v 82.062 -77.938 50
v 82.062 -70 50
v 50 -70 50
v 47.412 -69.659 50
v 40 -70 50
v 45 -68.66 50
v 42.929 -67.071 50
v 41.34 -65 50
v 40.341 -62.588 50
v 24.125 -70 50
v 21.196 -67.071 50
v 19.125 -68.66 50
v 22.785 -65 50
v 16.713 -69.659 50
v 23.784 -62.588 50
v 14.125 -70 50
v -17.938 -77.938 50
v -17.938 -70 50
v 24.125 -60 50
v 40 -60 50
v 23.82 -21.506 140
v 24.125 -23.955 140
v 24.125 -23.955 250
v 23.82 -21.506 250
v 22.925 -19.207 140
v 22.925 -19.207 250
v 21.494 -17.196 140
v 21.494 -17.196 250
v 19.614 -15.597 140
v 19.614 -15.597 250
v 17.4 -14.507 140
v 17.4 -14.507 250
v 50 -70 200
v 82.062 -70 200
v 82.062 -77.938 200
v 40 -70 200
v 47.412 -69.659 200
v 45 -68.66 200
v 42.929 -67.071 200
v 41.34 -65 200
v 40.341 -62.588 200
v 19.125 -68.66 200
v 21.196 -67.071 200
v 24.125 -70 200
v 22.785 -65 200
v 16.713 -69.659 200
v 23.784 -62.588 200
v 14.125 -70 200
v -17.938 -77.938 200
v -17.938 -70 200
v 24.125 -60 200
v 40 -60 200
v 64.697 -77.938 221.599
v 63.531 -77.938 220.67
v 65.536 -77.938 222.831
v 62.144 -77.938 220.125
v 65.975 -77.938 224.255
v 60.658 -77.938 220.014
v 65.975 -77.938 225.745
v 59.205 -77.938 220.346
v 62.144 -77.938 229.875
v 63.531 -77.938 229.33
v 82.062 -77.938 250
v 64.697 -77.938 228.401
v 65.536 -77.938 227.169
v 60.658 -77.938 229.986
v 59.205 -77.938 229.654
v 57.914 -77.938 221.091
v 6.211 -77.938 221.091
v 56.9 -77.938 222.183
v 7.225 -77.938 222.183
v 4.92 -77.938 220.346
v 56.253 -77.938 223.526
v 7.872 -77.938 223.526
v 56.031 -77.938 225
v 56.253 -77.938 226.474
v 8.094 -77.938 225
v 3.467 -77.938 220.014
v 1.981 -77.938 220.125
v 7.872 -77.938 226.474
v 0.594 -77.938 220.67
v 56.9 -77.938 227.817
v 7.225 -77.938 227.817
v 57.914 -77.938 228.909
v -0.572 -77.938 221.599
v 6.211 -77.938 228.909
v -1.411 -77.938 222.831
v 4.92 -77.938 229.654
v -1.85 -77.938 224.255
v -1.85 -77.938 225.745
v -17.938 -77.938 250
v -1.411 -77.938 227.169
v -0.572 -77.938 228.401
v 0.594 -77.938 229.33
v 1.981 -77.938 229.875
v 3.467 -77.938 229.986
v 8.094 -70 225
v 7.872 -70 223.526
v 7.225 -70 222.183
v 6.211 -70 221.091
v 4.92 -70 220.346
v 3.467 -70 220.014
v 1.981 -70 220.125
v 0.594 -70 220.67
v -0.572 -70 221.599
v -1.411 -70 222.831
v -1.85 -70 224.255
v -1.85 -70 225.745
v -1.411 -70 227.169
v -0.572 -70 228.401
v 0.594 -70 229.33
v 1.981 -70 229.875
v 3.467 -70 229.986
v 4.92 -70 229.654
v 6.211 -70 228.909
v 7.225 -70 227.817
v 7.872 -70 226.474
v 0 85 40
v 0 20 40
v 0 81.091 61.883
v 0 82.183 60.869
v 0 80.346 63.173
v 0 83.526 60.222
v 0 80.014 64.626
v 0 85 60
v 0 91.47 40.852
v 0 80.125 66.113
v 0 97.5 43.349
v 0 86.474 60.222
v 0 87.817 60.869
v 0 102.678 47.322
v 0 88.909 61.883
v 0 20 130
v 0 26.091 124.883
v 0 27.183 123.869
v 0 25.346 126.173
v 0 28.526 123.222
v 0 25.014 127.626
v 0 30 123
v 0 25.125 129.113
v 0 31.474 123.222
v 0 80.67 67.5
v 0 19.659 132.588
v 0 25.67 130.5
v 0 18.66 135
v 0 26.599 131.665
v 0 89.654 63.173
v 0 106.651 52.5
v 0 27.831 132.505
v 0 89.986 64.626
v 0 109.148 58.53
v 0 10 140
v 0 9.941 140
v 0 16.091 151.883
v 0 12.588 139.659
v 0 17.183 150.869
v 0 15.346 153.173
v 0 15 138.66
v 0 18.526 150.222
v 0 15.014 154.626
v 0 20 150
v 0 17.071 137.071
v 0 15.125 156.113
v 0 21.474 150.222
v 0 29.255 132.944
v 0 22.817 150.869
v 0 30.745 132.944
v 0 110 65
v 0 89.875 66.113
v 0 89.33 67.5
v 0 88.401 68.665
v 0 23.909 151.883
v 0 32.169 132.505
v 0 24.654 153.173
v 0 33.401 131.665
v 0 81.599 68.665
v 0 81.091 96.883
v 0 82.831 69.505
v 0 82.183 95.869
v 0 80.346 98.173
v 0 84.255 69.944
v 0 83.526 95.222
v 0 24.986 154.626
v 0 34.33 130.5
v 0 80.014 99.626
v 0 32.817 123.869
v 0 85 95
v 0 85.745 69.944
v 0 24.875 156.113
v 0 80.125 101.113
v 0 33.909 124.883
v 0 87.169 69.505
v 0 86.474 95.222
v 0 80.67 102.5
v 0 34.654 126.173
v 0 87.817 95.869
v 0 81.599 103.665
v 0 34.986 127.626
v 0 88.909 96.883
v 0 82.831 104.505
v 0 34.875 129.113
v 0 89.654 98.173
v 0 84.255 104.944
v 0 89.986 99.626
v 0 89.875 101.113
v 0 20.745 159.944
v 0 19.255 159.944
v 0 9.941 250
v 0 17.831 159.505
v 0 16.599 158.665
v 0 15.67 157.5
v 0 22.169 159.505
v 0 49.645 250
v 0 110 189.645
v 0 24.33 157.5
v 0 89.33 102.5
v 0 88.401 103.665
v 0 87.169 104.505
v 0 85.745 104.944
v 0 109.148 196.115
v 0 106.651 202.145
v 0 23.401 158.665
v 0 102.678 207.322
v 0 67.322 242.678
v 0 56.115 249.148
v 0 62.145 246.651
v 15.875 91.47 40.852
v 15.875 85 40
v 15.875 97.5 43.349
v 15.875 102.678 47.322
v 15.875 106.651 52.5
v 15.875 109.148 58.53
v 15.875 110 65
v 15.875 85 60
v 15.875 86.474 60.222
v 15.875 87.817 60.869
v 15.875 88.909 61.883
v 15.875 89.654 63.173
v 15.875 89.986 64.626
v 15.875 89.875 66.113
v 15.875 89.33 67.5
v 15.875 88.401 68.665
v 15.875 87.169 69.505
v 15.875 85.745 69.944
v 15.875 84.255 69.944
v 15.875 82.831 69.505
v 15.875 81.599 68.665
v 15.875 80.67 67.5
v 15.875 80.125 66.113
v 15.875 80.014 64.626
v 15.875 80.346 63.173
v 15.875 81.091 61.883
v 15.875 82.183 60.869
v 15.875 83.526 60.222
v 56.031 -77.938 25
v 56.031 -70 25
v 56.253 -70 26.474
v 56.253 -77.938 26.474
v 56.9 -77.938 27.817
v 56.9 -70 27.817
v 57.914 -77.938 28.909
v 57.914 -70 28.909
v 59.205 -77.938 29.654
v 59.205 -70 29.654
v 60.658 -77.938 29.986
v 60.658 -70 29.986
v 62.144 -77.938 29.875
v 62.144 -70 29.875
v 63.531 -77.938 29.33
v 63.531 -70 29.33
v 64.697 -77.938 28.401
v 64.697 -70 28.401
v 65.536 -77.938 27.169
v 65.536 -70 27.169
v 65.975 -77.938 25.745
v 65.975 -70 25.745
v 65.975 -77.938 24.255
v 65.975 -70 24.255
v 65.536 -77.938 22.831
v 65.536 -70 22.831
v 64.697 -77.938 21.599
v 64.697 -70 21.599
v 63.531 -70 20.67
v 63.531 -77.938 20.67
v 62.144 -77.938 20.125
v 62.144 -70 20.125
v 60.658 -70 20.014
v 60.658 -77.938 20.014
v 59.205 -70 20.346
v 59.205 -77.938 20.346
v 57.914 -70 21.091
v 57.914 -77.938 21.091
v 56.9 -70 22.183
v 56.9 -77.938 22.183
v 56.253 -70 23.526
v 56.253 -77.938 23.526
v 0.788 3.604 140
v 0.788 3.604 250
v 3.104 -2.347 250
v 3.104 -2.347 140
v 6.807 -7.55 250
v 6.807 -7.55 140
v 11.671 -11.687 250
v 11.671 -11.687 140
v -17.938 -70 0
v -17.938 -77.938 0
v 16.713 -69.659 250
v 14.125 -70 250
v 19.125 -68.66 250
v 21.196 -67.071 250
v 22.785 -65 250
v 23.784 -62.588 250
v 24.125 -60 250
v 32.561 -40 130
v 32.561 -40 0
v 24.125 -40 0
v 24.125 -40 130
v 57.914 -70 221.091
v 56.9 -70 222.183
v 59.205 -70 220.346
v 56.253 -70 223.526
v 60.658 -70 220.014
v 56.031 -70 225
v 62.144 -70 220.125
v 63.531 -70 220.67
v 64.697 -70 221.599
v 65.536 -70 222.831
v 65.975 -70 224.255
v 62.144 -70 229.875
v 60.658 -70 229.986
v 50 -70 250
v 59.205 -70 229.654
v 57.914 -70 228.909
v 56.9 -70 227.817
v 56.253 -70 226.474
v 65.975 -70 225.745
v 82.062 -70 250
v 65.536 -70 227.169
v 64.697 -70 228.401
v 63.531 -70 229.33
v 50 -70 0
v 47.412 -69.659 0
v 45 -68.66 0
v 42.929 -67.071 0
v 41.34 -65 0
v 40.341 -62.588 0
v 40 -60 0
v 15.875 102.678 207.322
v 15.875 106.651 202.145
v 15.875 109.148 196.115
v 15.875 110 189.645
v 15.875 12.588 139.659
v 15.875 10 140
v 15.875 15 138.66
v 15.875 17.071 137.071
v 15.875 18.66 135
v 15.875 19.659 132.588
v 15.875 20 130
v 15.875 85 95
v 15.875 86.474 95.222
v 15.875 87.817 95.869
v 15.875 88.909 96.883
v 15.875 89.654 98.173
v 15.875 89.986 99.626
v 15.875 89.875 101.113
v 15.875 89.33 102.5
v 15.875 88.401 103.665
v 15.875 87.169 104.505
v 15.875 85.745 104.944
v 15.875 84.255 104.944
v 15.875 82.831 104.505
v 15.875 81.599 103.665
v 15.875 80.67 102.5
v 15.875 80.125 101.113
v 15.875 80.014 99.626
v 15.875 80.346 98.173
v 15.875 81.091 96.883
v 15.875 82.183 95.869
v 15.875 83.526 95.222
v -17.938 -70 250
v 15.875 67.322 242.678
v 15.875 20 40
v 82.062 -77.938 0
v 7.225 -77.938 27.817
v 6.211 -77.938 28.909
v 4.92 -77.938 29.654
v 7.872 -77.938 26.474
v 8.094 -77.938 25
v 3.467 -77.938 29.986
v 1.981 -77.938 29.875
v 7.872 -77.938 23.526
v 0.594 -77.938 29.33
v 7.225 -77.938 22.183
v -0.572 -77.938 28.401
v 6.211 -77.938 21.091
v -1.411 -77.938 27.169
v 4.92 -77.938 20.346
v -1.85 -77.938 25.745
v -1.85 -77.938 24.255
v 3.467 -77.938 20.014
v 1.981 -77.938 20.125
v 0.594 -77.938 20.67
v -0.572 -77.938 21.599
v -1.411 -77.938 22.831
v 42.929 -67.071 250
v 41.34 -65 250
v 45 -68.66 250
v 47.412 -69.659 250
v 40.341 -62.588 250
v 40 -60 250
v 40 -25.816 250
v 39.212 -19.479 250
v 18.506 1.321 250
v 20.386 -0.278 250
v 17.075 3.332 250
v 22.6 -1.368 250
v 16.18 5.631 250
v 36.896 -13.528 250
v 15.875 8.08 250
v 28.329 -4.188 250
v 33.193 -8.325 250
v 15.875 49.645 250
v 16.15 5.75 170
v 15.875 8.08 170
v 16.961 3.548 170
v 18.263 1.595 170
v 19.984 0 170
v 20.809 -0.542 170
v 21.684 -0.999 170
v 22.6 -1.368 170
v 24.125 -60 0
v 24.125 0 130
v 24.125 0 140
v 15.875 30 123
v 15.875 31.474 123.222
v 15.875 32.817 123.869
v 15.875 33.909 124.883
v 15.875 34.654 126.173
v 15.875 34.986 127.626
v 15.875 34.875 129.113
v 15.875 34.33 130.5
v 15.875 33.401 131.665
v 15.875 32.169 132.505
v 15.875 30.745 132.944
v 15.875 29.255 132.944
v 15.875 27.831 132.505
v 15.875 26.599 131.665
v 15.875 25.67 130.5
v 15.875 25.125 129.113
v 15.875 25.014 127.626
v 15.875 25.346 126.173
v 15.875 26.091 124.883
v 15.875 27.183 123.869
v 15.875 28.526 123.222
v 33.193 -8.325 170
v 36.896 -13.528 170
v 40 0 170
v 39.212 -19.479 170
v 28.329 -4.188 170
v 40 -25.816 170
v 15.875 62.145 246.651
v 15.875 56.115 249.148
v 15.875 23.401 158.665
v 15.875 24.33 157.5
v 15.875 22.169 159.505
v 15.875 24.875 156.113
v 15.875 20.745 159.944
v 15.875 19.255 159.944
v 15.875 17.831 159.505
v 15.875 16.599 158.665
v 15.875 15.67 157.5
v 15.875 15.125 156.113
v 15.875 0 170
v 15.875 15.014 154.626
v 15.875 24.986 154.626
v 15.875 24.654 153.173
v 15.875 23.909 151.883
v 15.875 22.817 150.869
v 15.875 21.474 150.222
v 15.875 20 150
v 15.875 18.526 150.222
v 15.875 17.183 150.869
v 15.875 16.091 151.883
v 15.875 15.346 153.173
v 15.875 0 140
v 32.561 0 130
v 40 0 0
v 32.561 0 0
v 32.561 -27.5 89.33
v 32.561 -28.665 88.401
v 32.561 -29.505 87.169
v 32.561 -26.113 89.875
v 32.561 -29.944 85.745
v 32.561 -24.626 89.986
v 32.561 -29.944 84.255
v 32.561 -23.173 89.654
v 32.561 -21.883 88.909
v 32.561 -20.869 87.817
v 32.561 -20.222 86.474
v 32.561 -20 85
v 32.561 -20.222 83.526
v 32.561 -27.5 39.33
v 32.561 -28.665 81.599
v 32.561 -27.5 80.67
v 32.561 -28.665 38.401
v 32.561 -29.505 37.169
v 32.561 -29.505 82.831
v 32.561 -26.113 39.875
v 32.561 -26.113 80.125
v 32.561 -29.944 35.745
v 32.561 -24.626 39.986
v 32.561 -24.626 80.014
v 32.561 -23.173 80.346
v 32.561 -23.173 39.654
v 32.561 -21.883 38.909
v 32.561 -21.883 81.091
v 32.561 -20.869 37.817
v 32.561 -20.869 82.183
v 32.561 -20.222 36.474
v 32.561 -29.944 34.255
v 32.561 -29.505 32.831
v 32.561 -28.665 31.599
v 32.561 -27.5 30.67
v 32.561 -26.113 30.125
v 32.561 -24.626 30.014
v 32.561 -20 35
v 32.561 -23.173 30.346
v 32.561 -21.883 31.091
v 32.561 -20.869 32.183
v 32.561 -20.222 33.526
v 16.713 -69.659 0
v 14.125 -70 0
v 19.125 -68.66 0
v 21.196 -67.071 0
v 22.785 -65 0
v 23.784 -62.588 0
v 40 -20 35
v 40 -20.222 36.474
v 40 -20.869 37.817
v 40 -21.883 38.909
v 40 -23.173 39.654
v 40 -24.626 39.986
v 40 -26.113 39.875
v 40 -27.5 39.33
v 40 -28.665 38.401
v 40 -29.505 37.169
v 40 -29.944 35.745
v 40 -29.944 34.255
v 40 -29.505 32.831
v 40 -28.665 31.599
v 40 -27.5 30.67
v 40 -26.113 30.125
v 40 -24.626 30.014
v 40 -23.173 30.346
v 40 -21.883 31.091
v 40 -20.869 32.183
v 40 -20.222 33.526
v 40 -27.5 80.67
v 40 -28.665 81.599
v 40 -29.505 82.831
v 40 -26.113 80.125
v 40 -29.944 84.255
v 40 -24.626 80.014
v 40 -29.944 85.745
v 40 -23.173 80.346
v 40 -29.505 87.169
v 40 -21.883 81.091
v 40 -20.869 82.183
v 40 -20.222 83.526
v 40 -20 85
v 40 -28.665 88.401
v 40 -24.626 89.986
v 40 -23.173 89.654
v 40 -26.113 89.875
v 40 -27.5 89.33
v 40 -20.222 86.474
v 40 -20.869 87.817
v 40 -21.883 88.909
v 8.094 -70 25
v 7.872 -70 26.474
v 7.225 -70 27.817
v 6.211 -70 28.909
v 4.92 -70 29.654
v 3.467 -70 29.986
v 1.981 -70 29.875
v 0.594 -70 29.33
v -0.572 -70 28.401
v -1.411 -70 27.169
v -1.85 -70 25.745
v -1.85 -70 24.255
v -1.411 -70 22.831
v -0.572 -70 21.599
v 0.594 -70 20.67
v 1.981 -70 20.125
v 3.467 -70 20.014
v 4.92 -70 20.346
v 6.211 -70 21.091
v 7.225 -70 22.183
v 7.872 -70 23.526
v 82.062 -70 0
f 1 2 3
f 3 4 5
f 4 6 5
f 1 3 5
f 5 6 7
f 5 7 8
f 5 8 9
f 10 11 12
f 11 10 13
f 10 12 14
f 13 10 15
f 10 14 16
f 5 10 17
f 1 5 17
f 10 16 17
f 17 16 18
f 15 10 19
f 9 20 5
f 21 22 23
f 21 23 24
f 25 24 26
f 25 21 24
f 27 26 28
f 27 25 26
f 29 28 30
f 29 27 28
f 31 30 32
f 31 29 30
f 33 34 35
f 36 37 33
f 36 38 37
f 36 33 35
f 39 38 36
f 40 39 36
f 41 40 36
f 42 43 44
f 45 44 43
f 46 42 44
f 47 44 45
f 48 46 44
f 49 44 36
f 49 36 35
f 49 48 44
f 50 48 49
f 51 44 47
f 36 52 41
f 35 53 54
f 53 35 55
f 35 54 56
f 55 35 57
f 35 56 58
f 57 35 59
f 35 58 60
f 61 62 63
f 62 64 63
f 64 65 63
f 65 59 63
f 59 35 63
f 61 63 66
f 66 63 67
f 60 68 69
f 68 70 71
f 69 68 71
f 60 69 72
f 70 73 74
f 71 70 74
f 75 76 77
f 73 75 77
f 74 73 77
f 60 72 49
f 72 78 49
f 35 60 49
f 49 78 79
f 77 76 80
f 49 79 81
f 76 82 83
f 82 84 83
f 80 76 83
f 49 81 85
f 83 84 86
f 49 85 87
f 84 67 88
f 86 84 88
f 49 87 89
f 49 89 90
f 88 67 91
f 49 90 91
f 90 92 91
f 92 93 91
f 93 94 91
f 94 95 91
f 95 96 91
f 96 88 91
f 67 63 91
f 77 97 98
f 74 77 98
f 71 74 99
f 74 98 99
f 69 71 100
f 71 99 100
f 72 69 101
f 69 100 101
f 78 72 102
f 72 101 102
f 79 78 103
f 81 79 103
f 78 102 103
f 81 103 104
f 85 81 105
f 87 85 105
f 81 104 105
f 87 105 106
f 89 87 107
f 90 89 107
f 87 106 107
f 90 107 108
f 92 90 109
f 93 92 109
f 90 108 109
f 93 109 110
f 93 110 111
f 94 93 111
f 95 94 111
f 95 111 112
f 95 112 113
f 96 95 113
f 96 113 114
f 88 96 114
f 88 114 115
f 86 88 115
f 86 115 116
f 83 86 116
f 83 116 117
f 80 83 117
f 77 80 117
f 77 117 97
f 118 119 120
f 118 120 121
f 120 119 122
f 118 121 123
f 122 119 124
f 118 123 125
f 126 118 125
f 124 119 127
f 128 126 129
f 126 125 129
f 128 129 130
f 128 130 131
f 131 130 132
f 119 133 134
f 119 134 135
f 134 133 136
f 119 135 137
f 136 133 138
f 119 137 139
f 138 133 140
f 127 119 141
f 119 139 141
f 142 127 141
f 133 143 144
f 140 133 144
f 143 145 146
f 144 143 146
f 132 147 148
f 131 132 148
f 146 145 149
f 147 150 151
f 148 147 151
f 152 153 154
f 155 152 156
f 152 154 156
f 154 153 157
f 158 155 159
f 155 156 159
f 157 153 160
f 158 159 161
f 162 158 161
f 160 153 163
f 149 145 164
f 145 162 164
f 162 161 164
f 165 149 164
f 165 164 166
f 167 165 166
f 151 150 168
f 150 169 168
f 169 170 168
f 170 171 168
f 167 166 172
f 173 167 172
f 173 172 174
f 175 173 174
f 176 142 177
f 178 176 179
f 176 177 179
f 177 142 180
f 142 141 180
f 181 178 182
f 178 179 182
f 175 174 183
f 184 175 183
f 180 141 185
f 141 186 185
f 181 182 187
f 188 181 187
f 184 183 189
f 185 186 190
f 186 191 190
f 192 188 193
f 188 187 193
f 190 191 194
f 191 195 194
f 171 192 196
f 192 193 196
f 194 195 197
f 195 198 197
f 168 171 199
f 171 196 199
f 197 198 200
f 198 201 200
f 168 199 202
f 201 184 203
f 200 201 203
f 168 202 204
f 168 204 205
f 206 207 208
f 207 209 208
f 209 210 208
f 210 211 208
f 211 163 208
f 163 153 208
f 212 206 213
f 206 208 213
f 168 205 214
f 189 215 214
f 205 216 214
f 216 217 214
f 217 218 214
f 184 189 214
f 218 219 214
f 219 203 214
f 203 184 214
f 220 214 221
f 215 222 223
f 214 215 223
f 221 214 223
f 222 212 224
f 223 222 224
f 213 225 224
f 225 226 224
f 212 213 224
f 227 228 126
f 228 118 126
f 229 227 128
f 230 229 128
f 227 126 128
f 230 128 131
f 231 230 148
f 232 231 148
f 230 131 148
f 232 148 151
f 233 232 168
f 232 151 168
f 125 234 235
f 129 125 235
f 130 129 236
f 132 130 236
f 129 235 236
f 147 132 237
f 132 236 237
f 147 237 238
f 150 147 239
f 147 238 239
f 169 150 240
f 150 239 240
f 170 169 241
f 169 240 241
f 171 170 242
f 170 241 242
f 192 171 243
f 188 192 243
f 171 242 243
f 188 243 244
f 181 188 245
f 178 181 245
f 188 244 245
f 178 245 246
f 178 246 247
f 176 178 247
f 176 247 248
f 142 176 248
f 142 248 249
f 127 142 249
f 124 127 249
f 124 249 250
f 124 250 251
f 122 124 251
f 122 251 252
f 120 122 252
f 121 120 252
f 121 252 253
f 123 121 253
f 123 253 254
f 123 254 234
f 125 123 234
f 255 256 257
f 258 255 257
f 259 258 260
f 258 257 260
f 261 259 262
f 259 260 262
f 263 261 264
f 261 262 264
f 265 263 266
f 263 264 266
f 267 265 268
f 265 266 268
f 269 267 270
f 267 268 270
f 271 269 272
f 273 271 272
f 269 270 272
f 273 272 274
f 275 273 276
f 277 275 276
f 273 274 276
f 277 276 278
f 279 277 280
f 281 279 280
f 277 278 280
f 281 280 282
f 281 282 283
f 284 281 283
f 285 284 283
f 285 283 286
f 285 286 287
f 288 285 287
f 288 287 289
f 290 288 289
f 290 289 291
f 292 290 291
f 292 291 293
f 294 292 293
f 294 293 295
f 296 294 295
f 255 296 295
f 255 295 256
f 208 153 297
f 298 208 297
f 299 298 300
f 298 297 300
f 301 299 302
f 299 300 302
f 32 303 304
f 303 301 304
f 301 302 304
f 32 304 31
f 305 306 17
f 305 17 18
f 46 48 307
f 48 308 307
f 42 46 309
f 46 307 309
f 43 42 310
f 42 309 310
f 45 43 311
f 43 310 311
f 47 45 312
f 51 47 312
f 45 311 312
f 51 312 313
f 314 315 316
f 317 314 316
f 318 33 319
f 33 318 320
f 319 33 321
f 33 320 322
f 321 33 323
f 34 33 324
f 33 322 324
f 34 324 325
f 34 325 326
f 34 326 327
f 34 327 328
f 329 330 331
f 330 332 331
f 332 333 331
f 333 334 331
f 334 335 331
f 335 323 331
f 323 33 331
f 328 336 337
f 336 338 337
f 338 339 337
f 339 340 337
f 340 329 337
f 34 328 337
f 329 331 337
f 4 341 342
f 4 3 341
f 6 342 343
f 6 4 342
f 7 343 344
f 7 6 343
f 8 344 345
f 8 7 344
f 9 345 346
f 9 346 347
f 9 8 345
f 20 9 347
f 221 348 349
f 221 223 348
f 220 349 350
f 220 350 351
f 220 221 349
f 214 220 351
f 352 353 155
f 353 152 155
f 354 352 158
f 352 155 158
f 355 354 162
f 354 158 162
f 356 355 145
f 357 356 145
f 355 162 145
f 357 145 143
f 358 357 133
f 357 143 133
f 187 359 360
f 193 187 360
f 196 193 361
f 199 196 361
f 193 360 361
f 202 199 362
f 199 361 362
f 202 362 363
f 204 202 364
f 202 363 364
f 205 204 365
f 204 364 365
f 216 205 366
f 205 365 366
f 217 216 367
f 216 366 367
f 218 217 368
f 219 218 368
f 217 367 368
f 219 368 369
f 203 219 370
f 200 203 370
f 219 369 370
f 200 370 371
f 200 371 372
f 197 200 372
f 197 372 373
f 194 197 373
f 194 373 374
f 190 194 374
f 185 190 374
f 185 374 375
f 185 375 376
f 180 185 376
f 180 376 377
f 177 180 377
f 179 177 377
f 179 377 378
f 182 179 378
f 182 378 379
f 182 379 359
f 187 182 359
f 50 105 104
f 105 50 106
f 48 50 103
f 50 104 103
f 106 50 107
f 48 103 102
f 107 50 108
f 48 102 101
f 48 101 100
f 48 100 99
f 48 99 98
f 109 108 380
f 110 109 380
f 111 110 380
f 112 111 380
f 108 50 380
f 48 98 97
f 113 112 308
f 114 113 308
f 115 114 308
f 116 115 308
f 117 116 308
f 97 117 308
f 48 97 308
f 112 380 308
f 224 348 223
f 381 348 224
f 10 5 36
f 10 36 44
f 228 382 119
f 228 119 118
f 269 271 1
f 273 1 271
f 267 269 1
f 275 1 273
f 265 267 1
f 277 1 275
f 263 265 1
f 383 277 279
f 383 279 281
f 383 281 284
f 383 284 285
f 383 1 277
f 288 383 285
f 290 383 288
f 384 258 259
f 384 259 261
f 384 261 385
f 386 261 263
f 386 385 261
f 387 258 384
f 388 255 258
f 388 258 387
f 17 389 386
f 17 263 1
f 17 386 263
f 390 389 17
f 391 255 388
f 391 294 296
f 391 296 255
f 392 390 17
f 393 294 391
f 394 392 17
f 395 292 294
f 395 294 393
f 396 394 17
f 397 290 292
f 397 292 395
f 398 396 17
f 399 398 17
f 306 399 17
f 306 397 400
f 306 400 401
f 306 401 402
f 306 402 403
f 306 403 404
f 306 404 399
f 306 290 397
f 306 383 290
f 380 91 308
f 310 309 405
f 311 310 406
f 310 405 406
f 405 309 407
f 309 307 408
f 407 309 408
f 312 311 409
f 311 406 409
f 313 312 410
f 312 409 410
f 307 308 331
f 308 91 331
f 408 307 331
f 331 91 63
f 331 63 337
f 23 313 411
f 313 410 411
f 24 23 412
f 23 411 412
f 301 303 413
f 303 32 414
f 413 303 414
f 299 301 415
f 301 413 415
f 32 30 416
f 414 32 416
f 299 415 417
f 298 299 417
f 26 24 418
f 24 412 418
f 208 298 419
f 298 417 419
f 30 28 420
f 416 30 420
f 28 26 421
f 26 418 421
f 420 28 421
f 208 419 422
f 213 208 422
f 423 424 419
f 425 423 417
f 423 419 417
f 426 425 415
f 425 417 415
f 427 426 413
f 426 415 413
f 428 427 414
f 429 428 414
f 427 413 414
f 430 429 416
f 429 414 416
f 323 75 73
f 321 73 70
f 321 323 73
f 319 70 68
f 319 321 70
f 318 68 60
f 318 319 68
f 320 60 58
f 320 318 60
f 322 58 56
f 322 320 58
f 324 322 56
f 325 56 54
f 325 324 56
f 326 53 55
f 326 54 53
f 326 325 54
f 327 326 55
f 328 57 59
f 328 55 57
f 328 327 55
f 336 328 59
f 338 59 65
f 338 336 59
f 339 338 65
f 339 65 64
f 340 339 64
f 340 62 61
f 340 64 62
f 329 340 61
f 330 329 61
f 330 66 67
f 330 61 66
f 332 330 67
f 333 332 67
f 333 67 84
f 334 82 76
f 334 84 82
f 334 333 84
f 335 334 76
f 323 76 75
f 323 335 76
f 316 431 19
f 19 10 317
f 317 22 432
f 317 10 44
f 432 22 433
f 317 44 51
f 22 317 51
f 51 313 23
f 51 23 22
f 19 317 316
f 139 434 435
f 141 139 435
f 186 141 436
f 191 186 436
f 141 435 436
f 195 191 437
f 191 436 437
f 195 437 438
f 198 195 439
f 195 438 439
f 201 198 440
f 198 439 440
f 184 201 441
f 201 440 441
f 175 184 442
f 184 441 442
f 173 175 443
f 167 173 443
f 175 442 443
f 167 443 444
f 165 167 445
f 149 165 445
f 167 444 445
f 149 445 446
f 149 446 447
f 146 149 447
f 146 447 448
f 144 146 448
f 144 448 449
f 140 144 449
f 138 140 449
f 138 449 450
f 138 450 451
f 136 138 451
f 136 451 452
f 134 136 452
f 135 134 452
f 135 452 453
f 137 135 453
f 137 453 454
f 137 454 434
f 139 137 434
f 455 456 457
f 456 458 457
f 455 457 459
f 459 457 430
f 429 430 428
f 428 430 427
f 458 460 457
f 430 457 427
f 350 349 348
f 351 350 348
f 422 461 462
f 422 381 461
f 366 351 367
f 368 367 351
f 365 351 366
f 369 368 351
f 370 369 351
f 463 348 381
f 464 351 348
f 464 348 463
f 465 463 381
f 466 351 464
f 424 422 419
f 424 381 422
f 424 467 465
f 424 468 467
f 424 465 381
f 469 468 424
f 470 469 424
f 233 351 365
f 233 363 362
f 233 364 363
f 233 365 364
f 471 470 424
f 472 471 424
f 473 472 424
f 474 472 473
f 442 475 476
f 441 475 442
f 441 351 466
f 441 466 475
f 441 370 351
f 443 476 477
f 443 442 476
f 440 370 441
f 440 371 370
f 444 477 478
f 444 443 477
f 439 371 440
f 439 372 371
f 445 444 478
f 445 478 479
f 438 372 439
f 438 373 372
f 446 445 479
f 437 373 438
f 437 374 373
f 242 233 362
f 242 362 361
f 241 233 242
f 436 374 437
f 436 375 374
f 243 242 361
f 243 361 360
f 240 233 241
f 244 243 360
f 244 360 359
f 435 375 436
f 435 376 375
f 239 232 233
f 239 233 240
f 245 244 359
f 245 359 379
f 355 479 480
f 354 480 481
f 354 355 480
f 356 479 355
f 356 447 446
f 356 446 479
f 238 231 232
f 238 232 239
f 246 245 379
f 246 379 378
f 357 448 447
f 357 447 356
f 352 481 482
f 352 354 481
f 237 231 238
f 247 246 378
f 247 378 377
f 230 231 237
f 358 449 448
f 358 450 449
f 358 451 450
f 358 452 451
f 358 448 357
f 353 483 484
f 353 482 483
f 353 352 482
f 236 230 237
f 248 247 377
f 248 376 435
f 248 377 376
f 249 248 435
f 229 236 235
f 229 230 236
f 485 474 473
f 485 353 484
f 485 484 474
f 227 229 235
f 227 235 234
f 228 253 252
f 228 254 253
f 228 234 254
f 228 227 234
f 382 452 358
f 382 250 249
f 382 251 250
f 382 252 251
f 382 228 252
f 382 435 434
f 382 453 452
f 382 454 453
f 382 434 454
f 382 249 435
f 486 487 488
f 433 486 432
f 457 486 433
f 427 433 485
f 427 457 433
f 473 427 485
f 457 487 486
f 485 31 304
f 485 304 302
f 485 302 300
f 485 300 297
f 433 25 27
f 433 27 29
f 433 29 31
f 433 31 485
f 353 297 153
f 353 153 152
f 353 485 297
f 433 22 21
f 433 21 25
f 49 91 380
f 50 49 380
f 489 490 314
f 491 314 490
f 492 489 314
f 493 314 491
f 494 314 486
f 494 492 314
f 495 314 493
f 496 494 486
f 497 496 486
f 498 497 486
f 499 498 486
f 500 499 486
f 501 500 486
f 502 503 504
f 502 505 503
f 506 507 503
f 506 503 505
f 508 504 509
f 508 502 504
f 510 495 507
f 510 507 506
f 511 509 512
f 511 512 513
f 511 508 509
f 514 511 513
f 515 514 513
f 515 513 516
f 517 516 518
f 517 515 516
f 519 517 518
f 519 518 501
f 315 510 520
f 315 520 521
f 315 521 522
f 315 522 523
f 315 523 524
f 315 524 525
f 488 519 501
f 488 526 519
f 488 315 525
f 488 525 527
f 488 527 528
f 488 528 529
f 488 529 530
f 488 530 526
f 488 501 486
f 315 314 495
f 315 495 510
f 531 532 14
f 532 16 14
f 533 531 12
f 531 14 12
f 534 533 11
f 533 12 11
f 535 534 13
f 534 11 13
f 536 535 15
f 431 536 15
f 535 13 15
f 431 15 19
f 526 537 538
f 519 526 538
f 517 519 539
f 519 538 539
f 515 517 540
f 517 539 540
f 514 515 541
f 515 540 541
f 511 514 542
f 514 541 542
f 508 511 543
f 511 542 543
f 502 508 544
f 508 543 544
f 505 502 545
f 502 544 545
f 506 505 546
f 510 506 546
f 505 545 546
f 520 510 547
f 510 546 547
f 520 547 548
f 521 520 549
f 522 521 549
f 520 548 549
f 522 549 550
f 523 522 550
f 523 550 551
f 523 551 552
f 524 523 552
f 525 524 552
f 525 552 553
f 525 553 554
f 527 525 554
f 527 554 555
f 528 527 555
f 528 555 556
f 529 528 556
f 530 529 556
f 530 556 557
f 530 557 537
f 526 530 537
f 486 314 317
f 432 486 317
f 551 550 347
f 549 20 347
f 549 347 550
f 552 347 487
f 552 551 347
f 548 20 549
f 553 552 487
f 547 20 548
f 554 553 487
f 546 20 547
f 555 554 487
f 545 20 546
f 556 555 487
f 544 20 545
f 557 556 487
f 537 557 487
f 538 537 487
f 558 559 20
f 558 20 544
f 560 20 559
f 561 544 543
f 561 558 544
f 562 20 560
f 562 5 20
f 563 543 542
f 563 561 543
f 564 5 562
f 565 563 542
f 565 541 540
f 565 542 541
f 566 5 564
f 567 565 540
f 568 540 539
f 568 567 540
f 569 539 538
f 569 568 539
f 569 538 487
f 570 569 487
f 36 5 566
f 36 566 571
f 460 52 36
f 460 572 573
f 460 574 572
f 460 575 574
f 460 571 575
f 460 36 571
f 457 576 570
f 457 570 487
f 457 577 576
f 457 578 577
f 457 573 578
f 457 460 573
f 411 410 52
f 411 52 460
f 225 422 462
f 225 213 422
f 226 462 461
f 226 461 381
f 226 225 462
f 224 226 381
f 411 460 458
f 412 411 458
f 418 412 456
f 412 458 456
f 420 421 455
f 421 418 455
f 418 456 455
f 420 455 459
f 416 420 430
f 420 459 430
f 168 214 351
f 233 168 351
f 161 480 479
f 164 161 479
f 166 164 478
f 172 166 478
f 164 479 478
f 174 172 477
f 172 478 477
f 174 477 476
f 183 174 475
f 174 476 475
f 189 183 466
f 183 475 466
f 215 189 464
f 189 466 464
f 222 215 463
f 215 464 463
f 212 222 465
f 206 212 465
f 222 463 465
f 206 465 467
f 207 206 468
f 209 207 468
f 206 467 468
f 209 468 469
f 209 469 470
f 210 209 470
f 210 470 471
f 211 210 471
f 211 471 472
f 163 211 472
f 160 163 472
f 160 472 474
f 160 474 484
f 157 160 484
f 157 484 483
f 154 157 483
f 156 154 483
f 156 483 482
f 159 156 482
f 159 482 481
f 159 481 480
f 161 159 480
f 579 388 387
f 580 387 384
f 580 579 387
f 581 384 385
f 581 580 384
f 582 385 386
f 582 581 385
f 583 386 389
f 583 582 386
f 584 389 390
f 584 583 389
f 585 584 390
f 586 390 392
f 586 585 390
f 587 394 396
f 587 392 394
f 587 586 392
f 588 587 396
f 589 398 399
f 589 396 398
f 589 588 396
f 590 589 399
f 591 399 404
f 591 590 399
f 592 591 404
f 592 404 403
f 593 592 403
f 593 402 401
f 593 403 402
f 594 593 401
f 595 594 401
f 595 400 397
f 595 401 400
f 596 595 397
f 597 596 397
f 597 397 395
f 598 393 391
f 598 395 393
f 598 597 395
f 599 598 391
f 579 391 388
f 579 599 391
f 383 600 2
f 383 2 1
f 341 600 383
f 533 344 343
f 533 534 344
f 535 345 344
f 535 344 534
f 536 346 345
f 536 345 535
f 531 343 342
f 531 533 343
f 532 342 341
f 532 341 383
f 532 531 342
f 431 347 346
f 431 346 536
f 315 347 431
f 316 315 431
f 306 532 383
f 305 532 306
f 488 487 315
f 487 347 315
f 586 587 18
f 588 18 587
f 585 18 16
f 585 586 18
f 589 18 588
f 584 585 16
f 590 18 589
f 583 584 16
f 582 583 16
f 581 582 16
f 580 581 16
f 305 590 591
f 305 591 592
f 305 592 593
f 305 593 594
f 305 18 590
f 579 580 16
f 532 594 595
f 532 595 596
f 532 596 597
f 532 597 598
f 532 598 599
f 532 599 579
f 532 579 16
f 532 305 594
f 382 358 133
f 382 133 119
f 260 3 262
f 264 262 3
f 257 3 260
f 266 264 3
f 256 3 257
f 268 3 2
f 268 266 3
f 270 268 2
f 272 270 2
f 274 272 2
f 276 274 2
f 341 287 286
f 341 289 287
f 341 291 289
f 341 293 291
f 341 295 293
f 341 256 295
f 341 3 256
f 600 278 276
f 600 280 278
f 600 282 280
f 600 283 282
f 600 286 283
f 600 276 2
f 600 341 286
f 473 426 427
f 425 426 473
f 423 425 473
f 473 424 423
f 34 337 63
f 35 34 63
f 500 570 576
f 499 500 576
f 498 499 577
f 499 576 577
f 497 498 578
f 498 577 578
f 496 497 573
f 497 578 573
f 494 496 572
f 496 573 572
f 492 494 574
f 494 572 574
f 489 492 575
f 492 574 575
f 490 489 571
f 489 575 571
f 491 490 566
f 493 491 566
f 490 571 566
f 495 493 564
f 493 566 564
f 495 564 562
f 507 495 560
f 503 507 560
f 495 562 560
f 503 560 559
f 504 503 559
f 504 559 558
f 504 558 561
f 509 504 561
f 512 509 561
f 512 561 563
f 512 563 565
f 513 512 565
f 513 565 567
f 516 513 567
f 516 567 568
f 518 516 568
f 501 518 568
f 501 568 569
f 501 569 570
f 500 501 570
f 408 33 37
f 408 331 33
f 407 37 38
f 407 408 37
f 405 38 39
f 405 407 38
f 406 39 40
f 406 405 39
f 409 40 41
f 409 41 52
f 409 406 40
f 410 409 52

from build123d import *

# Parameters (mm, degrees)
BOSS_EXTRUDE1_DEPTH     = 250
BOSS_EXTRUDE2_DEPTH     = 50
SKETCH3_R               = 5
CUT_EXTRUDE1_DEPTH      = 319.801276513
FILLET1_R               = 10
MIRROR2_COPY_1_SKETCH_R = 5
MIRROR2_COPY_1_DEPTH    = 319.801276513
FILLET1_OF_MIRROR2_R    = 10
CUT_EXTRUDE2_DEPTH      = 282.035202699
FILLET2_R               = 25
CUT_EXTRUDE3_DEPTH      = 282.035202699
FILLET3_R               = 25
SKETCH6_R               = 5
CUT_EXTRUDE4_DEPTH      = 280.207367213
CUT_EXTRUDE5_DEPTH      = 170
FILLET4_R               = 10
FILLET5_R               = 25.875
FILLET6_R               = 10
BOSS_EXTRUDE3_DEPTH     = 30
SKETCH9_W               = 15.875
SKETCH9_H               = 40
BOSS_EXTRUDE4_DEPTH     = 140
FILLET7_R               = 25.875
FILLET8_R               = 10
SKETCH10_W              = 8.436021397
SKETCH10_H              = 40
CUT_EXTRUDE6_DEPTH      = 130
SKETCH11_R              = 5
CUT_EXTRUDE7_DEPTH      = 280.207367213


with BuildPart() as part:
    # Sketch1 → Boss-Extrude1 (new body)
    with BuildSketch(Plane.XY):
        Polygon((0, 0), (0, 110), (15.875, 110), (15.875, 0), (40, 0), (40, -70), (24.125, -70), (24.125, -15.875), (0, -15.875), align=None)
    extrude(amount=BOSS_EXTRUDE1_DEPTH)

    # Sketch2 → Boss-Extrude2 (add)
    with BuildSketch(Plane(origin=(0, 0, 0), x_dir=(-1, 0, 0), z_dir=(0, 0, -1))):
        Polygon((-32.0625, -70), (-82.0625, -70), (-82.0625, -77.9375), (17.9375, -77.9375), (17.9375, -70), align=None)
    boss_extrude2 = extrude(amount=-BOSS_EXTRUDE2_DEPTH)

    # Sketch3 → Cut-Extrude1 (cut, through all)
    with BuildSketch(Plane(origin=(0, -70, 0), x_dir=(1, 0, 0), z_dir=(0, 1, 0))):
        with Locations(Location((61.03125, -25, 0), (0, 0, 180))):
            Circle(SKETCH3_R)
    cut_extrude1 = extrude(amount=-CUT_EXTRUDE1_DEPTH, mode=Mode.SUBTRACT)

    # Mirror1: Cut-Extrude1 across plane
    add(cut_extrude1.mirror(Plane(origin=(32.0625, 0, 0), x_dir=(0, 0, 1), z_dir=(1, 0, 0))), mode=Mode.SUBTRACT)

    # Fillet1
    fillet1_edges = [part.edges().sort_by_distance(p)[0] for p in [
        (40, -70, 25),
        (24.125, -70, 25),
    ]]
    fillet(fillet1_edges, radius=FILLET1_R)

    # Mirror2: Boss-Extrude2, Cut-Extrude1 across plane
    add(boss_extrude2.mirror(Plane(origin=(0, 0, 125), x_dir=(1, 0, 0), z_dir=(0, 0, -1))))
    add(cut_extrude1.mirror(Plane(origin=(0, 0, 125), x_dir=(1, 0, 0), z_dir=(0, 0, -1))), mode=Mode.SUBTRACT)

    # Mirror2 copy 1 sketch → Mirror2 copy 1 (cut, through all)
    with BuildSketch(Plane(origin=(64.125, -70, 250), x_dir=(-1, 0, 0), z_dir=(0, 1, 0))):
        with Locations(Location((61.03125, -25, 0), (0, 0, 180))):
            Circle(MIRROR2_COPY_1_SKETCH_R)
    extrude(amount=-MIRROR2_COPY_1_DEPTH, mode=Mode.SUBTRACT)

    # Fillet1 of Mirror2
    fillet1_of_mirror2_edges = [part.edges().sort_by_distance(p)[0] for p in [
        (40, -70, 225),
        (24.125, -70, 225),
    ]]
    fillet(fillet1_of_mirror2_edges, radius=FILLET1_OF_MIRROR2_R)

    # Sketch4 → Cut-Extrude2 (cut, through all)
    with BuildSketch(Plane(origin=(15.875, 0, 0), x_dir=(0, 0, -1), z_dir=(1, 0, 0))):
        Polygon((0, 0), (-140, 0), (-140, 20), (-40, 20), (-40, 110), (0, 110), align=None)
    extrude(amount=-CUT_EXTRUDE2_DEPTH, mode=Mode.SUBTRACT)

    # Fillet2
    fillet2_edges = [part.edges().sort_by_distance(p)[0] for p in [
        (7.9375, 110, 40),
    ]]
    fillet(fillet2_edges, radius=FILLET2_R)

    # Sketch5 → Cut-Extrude3 (cut, through all)
    with BuildSketch(Plane(origin=(15.875, 0, 0), x_dir=(0, 0, -1), z_dir=(1, 0, 0))):
        Polygon((-250, 60), (-250, 110), (-200, 110), align=None)
    extrude(amount=-CUT_EXTRUDE3_DEPTH, mode=Mode.SUBTRACT)

    # Fillet3
    fillet3_edges = [part.edges().sort_by_distance(p)[0] for p in [
        (7.9375, 60, 250),
        (7.9375, 110, 200),
    ]]
    fillet(fillet3_edges, radius=FILLET3_R)

    # Sketch6 → Cut-Extrude4 (cut, through all)
    with BuildSketch(Plane(origin=(40, 0, 0), x_dir=(0, 0, -1), z_dir=(1, 0, 0))):
        with Locations((-65, 85)):
            Circle(SKETCH6_R)
        with Locations((-100, 85)):
            Circle(SKETCH6_R)
        with Locations((-128, 30)):
            Circle(SKETCH6_R)
        with Locations((-155, 20)):
            Circle(SKETCH6_R)
        with Locations(Location((-35, -25, 0), (0, 0, 90))):
            Circle(SKETCH6_R)
        with Locations(Location((-85, -25, 0), (0, 0, 90))):
            Circle(SKETCH6_R)
    extrude(amount=-CUT_EXTRUDE4_DEPTH, mode=Mode.SUBTRACT)

    # Sketch7 → Cut-Extrude5 (cut)
    with BuildSketch(Plane(origin=(0, 0, 0), x_dir=(-1, 0, 0), z_dir=(0, 0, -1))):
        Polygon((0, 0), (-40, 0), (-40, -40), (-24.125, -40), (-24.125, -15.875), (0, -15.875), align=None)
    extrude(amount=-CUT_EXTRUDE5_DEPTH, mode=Mode.SUBTRACT)

    # Fillet4
    fillet4_edges = [part.edges().sort_by_distance(p)[0] for p in [
        (7.9375, 20, 140),
    ]]
    fillet(fillet4_edges, radius=FILLET4_R)

    # Fillet5
    # the kernel refuses this fillet: 25.875 mm, written as the material it takes off along each edge
    with BuildSketch(Plane(origin=(40, 0, 105.460616433), x_dir=(-1, 0, 0), z_dir=(0, 0, 1))) as fillet5_piece_1:
        with BuildLine():
            CenterArc((25.875, 25.815753427), FILLET5_R, 180, 86.121962796)
            Line((0, 25.815753427), (-0.5175, 25.815753427))
            Line((-0.5175, 25.815753427), (-0.5175, 0))
            Line((-0.5175, 0), (0, -0.5175))
            ThreePointArc((0, -0.5175), (12.0625, -0.5175), (24.09, -0.516315069))
            Line((24.09, -0.516315069), (24.125, 0))
        make_face()
    extrude(amount=209.078767135, mode=Mode.SUBTRACT)

    # Fillet6
    fillet6_edges = [part.edges().sort_by_distance(p)[0] for p in [
        (15.875, 0, 210),
    ]]
    fillet(fillet6_edges, radius=FILLET6_R)

    # Sketch8 → Boss-Extrude3 (add)
    with BuildSketch(Plane(origin=(0, 0, 170), x_dir=(-1, 0, 0), z_dir=(0, 0, -1))):
        Polygon((-40, -40), (-24.125, -40), (-24.125, -15.875), (0, -15.875), (0, 0), (-40, 0), align=None)
    extrude(amount=BOSS_EXTRUDE3_DEPTH)

    # Sketch9 → Boss-Extrude4 (add)
    with BuildSketch(Plane(origin=(0, 0, 140), x_dir=(-1, 0, 0), z_dir=(0, 0, -1))):
        with Locations((-32.0625, -20)):
            Rectangle(SKETCH9_W, SKETCH9_H)
    extrude(amount=BOSS_EXTRUDE4_DEPTH)

    # Fillet7
    # the kernel refuses this fillet: 25.875 mm, written as the material it takes off along each edge
    with BuildSketch(Plane(origin=(0, -15.875, 75.460616433), x_dir=(1, 0, 0), z_dir=(0, 0, 1))) as fillet7_piece_1:
        with BuildLine():
            CenterArc((25.875, 25.815753427), FILLET7_R, 180, 86.121962796)
            Line((0, 25.815753427), (-0.5175, 25.815753427))
            Line((-0.5175, 25.815753427), (-0.5175, 0))
            Line((-0.5175, 0), (0, -0.5175))
            ThreePointArc((0, -0.5175), (12.0625, -0.5175), (24.09, -0.516315069))
            Line((24.09, -0.516315069), (24.125, 0))
        make_face()
    extrude(amount=239.078767135, mode=Mode.SUBTRACT)

    # Fillet8
    # the kernel refuses this fillet: 10 mm, written as the material it adds along each edge
    with BuildSketch(Plane(origin=(24.125, -15.875, 140), x_dir=(0, -1, 0), z_dir=(0, 0, 1))) as fillet8_piece_1:
        with BuildLine():
            CenterArc((8.080457645, -10), FILLET8_R, 90, 70.881309601)
            ThreePointArc((-1.36796356, -6.724738676), (-0.46005439, -3.407921221), (0, 0))
            Line((0, 0), (8.080457645, 0))
        make_face()
    extrude(amount=110)

    # Sketch10 → Cut-Extrude6 (cut)
    with BuildSketch(Plane(origin=(0, 0, 0), x_dir=(-1, 0, 0), z_dir=(0, 0, -1))):
        with Locations((-28.343010699, -20)):
            Rectangle(SKETCH10_W, SKETCH10_H)
    extrude(amount=-CUT_EXTRUDE6_DEPTH, mode=Mode.SUBTRACT)

    # Sketch11 → Cut-Extrude7 (cut, through all)
    with BuildSketch(Plane(origin=(40, 0, 0), x_dir=(0, 0, -1), z_dir=(1, 0, 0))):
        with Locations(Location((-35, -25, 0), (0, 0, 90))):
            Circle(SKETCH11_R)
        with Locations(Location((-85, -25, 0), (0, 0, 90))):
            Circle(SKETCH11_R)
    extrude(amount=-CUT_EXTRUDE7_DEPTH, mode=Mode.SUBTRACT)


solid = part.part
